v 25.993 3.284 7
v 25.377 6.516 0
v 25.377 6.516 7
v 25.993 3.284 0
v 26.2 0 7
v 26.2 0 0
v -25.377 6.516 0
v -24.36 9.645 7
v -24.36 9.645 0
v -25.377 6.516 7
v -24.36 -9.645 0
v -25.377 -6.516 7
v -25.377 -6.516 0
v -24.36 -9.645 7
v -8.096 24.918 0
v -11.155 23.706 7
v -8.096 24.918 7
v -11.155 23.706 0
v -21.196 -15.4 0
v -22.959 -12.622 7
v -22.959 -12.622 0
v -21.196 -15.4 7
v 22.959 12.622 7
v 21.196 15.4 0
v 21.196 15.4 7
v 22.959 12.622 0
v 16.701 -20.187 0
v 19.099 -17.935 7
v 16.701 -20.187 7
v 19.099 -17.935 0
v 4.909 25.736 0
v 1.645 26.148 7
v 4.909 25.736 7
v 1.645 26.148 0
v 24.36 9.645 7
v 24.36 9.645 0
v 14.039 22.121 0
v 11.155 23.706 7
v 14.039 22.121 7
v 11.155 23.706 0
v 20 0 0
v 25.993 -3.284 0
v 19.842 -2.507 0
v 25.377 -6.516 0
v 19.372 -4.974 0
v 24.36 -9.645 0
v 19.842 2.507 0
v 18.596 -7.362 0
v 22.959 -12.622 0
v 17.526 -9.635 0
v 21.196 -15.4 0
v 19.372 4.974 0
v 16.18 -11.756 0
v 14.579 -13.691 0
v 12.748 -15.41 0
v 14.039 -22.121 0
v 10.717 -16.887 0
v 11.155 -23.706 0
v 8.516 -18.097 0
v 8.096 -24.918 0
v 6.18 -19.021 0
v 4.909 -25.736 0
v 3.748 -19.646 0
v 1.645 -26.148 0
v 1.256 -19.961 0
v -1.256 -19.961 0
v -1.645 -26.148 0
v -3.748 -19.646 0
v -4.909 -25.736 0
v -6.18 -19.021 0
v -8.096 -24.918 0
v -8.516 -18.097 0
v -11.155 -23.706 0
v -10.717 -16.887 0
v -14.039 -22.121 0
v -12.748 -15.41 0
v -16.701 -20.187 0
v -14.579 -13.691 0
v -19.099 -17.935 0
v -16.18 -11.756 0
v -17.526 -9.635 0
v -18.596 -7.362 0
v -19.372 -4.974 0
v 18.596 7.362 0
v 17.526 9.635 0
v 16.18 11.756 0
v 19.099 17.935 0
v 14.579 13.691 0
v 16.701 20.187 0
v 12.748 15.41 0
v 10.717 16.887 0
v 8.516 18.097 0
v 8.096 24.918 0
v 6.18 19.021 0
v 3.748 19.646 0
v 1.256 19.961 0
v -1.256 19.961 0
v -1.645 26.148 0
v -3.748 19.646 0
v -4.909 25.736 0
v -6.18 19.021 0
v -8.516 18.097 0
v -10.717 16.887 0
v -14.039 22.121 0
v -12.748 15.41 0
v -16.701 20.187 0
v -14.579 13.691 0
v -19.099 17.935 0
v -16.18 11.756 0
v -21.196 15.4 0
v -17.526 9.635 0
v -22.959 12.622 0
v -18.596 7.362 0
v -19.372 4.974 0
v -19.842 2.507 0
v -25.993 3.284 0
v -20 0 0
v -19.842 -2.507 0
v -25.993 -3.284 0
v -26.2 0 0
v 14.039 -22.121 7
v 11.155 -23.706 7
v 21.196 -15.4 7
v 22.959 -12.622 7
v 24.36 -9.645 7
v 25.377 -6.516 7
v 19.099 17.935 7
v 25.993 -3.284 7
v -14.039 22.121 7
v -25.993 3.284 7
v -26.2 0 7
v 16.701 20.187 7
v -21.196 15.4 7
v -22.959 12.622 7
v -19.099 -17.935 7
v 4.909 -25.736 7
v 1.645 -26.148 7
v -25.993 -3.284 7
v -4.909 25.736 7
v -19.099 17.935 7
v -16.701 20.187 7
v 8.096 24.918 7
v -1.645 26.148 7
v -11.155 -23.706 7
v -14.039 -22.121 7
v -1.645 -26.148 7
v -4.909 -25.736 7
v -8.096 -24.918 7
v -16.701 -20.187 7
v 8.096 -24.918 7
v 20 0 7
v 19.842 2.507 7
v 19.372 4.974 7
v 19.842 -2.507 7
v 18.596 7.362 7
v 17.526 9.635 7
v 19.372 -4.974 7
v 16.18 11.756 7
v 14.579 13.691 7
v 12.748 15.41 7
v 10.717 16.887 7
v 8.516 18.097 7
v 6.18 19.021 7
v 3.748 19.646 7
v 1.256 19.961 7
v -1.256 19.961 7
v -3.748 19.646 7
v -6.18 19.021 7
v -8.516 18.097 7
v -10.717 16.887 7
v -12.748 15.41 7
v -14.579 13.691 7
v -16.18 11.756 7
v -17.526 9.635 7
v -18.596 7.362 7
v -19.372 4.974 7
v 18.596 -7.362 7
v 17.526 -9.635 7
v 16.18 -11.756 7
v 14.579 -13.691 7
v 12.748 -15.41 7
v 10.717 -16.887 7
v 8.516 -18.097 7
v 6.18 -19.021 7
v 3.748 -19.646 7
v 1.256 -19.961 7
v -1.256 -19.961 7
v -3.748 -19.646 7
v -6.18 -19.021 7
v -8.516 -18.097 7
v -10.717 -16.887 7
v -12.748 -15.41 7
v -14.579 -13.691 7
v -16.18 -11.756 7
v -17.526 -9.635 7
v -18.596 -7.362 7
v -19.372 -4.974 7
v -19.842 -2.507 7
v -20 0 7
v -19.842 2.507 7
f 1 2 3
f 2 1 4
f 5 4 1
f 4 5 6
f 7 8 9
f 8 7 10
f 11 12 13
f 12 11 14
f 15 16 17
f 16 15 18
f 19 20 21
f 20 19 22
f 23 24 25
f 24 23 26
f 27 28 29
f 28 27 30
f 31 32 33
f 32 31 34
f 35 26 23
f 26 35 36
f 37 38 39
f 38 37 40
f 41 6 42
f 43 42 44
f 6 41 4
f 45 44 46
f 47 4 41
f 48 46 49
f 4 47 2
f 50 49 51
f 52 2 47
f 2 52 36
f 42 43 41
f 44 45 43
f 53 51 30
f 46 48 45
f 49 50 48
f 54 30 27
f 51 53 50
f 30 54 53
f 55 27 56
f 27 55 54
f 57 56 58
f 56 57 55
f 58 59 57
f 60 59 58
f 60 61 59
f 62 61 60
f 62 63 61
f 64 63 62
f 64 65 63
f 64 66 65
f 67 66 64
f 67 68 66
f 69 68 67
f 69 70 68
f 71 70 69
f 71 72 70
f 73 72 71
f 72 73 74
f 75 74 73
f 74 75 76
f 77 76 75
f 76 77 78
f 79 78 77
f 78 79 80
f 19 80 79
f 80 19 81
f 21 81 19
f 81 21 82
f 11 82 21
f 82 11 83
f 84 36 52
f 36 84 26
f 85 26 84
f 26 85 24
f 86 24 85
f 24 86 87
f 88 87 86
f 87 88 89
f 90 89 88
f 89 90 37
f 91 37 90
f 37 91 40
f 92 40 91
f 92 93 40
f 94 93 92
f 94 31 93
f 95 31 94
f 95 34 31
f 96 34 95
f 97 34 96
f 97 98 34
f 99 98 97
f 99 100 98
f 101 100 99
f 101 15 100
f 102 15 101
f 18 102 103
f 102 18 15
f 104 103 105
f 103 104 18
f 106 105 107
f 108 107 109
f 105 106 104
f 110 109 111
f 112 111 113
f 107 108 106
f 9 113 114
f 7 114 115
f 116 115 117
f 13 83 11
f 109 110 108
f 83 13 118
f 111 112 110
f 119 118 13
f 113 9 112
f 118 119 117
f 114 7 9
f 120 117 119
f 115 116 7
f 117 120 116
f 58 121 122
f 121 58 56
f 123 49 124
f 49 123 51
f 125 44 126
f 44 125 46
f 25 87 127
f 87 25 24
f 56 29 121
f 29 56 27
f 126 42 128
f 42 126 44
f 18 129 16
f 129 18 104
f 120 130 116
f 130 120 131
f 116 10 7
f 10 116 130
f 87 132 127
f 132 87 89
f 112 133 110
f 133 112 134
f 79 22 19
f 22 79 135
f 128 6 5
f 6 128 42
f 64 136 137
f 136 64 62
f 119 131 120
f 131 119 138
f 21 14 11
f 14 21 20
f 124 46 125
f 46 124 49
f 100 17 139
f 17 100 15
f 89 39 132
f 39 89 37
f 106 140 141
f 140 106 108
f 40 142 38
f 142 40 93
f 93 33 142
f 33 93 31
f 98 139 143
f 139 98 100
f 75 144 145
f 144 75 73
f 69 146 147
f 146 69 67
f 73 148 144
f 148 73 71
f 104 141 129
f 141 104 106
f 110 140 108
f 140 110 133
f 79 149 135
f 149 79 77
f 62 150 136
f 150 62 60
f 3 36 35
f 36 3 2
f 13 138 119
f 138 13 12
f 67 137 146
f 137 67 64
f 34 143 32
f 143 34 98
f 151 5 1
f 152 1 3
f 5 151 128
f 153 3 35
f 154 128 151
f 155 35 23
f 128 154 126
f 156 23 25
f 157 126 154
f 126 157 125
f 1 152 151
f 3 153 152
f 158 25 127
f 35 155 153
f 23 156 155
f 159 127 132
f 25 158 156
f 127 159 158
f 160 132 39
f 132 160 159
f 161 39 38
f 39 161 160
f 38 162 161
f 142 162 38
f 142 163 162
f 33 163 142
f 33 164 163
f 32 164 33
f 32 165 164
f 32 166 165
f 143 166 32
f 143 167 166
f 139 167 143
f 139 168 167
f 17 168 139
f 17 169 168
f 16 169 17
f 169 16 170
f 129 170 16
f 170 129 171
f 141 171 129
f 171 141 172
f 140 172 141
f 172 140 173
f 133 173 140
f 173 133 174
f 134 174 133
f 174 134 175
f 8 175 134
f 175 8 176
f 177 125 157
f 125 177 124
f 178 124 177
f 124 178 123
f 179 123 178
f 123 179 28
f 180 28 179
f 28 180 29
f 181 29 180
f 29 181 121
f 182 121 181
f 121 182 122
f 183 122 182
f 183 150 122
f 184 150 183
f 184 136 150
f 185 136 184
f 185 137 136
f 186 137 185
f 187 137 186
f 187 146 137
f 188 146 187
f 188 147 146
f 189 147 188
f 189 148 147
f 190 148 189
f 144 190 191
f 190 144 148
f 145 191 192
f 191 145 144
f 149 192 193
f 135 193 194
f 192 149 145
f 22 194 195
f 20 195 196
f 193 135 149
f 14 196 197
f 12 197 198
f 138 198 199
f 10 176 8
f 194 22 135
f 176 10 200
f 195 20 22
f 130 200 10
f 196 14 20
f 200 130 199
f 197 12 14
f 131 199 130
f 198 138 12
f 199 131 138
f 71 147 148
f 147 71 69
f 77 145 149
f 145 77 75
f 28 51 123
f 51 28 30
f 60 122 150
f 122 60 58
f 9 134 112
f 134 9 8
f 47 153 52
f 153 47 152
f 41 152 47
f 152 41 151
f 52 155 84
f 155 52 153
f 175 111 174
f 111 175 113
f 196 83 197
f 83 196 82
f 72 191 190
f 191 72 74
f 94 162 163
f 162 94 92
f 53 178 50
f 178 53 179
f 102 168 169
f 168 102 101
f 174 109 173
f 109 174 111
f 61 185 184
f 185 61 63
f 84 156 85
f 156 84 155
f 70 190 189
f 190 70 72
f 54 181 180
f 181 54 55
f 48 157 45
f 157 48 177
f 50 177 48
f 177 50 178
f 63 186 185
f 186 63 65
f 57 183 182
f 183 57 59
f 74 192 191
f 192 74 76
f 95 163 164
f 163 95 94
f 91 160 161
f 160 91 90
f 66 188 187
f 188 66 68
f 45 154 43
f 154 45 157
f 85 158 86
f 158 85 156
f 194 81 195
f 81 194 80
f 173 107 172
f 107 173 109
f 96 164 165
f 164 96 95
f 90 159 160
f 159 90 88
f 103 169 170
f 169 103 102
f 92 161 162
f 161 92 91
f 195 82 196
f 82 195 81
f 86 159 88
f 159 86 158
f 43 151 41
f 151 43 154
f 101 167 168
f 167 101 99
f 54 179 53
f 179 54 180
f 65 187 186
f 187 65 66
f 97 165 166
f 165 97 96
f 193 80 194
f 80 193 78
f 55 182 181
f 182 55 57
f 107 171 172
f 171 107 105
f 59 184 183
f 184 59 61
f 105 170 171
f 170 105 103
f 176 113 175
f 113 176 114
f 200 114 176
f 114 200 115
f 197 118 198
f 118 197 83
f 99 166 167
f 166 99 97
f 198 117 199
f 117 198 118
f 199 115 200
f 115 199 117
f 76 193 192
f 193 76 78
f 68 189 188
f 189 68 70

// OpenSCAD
$fn = 50;


difference() {
	union() {
		cylinder(h = 7, r = 26.2000000000);
	}
	union() {
		cylinder(h = 7, r = 20.0000000000);
	}
}
